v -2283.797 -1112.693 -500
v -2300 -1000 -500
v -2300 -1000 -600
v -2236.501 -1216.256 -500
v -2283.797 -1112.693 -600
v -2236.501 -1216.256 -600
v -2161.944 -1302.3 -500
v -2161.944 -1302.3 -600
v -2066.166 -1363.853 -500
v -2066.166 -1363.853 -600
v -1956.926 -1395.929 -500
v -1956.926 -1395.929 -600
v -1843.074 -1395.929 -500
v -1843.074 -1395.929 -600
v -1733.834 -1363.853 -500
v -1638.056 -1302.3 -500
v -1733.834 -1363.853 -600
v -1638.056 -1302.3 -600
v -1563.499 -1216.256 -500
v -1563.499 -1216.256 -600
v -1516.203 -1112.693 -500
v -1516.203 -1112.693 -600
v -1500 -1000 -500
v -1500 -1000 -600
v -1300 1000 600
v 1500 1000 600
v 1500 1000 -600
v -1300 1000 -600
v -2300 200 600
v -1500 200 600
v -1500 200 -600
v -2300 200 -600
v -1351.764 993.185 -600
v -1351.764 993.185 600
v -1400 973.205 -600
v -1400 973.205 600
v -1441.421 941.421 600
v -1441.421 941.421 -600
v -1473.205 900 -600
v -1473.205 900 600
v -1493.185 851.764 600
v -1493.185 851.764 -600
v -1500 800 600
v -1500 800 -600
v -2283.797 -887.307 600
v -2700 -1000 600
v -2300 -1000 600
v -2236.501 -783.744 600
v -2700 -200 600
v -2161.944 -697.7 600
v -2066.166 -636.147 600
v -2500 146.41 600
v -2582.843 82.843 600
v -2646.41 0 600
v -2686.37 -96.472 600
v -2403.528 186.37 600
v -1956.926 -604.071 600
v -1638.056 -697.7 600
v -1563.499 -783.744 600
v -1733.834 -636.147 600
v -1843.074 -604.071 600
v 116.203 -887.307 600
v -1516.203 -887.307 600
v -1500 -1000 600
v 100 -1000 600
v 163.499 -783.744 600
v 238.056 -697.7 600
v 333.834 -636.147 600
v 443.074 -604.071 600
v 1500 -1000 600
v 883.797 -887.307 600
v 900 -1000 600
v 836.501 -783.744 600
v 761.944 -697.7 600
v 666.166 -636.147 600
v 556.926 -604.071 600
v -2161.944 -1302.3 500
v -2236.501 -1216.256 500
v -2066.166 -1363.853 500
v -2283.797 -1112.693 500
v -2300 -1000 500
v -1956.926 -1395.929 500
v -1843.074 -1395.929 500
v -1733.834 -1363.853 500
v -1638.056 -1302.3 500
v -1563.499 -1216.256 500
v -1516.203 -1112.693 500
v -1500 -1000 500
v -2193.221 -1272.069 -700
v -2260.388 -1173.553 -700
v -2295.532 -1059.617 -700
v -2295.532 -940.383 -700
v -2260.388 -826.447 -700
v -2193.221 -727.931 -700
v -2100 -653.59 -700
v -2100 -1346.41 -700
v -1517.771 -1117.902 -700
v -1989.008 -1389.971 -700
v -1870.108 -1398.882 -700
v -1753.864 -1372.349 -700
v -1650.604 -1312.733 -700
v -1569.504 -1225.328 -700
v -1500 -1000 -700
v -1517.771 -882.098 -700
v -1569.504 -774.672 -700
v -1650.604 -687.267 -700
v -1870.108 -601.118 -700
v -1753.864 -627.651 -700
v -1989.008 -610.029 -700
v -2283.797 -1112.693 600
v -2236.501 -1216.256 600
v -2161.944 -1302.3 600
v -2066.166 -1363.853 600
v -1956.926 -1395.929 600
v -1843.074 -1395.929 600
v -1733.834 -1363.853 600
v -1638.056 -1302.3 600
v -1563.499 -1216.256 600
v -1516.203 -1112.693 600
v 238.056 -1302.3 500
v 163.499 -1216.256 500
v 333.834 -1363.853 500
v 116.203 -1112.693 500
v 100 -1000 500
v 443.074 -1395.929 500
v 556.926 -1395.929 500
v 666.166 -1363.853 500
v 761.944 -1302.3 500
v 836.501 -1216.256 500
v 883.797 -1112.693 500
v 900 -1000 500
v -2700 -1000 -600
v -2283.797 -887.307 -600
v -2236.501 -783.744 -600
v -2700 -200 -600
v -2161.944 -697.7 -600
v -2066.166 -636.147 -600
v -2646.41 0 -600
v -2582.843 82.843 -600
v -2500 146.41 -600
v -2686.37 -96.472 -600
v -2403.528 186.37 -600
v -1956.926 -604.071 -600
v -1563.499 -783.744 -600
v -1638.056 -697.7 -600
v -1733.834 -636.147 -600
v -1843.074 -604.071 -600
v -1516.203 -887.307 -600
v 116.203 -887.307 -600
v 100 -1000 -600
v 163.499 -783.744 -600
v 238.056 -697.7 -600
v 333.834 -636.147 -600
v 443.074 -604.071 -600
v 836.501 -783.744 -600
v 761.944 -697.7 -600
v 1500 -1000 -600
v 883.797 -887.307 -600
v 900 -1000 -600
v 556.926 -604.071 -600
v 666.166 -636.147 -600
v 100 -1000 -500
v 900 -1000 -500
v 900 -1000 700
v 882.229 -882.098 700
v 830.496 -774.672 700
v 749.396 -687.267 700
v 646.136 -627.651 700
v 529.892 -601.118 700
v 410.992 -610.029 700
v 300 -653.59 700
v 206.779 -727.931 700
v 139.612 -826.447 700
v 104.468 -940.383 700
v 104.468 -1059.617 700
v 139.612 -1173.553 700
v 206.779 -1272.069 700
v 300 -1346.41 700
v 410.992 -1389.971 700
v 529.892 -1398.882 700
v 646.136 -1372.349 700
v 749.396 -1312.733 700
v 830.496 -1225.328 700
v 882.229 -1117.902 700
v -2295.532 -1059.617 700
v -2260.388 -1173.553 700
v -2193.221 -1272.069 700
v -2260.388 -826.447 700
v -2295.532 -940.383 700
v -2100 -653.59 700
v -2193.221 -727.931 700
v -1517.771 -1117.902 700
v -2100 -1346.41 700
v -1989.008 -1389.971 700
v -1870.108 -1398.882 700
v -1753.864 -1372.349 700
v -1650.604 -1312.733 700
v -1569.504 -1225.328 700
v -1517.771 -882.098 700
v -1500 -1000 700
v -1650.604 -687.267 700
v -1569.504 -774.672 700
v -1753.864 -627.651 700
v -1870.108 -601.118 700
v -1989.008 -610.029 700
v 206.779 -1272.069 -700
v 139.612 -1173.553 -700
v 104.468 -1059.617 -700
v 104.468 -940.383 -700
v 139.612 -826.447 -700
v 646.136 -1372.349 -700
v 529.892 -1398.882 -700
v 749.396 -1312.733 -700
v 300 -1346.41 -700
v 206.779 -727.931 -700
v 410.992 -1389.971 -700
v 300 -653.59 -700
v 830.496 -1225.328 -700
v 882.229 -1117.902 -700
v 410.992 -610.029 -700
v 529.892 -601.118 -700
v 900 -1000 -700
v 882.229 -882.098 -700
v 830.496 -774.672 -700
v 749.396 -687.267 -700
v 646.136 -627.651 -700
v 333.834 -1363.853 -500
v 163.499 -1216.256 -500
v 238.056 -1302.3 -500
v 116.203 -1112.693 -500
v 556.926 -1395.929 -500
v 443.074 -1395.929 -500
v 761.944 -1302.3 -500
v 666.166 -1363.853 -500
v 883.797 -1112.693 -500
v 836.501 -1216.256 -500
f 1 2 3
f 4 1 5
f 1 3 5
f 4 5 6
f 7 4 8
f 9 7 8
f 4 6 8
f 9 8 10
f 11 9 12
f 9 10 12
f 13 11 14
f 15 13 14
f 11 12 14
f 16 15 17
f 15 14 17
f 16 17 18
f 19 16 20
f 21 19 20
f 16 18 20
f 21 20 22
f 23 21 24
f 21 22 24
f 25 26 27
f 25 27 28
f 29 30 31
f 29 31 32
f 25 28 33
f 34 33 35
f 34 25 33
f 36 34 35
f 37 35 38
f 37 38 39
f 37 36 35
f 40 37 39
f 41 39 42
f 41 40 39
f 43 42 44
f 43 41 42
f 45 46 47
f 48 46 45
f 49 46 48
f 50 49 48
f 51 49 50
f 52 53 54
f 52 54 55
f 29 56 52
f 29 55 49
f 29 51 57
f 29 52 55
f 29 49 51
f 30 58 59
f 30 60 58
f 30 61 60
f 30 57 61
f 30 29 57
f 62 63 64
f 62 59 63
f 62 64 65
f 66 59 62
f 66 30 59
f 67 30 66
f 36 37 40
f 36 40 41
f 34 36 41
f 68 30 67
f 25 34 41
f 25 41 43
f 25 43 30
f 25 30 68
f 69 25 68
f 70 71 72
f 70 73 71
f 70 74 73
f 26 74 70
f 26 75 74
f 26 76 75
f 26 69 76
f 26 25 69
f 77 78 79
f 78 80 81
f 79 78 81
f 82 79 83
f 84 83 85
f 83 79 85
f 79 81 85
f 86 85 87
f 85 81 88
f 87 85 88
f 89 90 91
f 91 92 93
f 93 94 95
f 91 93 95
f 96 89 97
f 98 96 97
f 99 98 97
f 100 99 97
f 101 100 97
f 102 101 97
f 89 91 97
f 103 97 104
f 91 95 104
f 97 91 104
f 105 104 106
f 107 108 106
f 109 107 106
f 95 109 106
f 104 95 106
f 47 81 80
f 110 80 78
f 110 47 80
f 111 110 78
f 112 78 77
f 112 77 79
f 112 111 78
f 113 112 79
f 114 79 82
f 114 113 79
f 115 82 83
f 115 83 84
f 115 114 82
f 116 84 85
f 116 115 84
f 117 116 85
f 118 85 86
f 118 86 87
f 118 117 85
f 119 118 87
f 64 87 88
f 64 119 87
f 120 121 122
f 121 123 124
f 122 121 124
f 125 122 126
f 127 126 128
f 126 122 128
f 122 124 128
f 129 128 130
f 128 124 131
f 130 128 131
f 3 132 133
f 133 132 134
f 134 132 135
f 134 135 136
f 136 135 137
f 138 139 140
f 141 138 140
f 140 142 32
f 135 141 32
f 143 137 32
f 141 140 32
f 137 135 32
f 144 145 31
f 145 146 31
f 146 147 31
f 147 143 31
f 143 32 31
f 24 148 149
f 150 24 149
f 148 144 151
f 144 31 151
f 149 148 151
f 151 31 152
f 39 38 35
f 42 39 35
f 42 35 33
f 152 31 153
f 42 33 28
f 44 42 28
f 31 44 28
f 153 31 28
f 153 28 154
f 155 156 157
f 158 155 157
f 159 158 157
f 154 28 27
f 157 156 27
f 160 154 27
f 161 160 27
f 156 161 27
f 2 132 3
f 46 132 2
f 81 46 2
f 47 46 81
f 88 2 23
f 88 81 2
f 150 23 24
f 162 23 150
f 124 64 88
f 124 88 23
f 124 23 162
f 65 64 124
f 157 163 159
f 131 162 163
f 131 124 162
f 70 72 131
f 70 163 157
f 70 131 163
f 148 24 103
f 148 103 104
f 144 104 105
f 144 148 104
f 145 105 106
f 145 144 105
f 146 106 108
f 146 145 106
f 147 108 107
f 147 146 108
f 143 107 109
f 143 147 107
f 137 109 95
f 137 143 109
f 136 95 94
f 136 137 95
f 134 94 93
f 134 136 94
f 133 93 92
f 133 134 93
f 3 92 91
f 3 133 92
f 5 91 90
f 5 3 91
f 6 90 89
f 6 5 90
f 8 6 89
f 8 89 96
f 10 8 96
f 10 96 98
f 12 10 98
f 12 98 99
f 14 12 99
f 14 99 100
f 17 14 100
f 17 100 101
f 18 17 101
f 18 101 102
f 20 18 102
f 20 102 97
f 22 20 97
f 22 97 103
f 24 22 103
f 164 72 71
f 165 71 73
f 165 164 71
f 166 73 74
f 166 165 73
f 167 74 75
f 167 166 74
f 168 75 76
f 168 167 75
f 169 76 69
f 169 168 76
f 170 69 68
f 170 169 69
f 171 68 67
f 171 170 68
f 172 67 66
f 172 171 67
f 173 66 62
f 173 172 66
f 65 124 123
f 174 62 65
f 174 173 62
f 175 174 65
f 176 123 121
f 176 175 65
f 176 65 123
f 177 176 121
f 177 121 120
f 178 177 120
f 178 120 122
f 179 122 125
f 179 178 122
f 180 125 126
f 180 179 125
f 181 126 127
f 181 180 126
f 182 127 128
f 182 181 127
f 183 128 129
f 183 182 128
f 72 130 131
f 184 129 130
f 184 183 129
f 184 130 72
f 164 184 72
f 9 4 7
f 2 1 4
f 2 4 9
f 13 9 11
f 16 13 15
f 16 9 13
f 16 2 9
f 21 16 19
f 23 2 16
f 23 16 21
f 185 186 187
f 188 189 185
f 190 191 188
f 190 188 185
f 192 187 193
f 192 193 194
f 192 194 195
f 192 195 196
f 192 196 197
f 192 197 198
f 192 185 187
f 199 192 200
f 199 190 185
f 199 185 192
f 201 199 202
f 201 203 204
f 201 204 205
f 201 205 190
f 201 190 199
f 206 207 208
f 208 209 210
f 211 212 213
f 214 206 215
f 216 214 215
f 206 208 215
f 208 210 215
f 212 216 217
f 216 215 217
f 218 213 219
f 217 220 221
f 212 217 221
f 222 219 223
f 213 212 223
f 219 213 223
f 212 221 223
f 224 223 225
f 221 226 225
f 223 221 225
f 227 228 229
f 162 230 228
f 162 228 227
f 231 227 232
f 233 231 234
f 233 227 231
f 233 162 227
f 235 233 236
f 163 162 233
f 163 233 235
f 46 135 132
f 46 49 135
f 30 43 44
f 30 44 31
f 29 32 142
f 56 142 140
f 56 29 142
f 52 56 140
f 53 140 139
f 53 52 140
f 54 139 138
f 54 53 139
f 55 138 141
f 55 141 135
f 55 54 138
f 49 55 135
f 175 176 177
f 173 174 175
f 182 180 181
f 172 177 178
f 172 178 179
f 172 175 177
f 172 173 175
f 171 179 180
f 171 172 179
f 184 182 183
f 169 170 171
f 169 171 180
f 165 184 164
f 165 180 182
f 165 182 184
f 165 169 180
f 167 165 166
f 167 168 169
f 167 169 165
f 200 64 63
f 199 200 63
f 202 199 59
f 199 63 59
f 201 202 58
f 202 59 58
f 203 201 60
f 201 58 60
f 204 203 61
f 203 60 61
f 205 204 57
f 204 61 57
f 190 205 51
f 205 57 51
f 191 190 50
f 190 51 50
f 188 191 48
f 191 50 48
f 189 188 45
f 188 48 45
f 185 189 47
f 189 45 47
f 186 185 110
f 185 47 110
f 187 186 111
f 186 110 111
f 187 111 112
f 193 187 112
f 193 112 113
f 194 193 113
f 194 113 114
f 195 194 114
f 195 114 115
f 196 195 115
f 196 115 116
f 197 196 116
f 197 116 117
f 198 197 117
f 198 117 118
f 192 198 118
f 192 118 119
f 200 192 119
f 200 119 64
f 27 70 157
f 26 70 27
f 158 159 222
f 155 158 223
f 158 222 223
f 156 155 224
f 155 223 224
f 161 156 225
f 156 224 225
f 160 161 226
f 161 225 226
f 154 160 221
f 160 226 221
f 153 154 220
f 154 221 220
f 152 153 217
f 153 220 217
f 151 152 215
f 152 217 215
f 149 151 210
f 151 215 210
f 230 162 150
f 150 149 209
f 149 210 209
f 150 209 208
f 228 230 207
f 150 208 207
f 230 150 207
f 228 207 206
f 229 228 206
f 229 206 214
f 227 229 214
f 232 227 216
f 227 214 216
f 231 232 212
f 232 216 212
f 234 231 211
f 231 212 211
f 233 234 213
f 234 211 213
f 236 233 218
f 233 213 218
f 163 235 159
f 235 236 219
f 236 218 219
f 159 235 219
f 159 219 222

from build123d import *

# Parameters (mm, degrees)
EXTRUDE_1_DEPTH = 600
EXTRUDE_START   = 600
SKETCH_1_3_R    = 400
EXTRUDE_2_DEPTH = 100


with BuildPart() as part:
    # 스케치1 → 보스-돌출1 (new, symmetric)
    with BuildSketch(Plane.XY):
        with BuildLine():
            Line((1500, -1000), (1500, 1000))
            Line((1500, 1000), (-1300, 1000))
            ThreePointArc((-1300, 1000), (-1441.421356237, 941.421356237), (-1500, 800))
            Line((-1500, 800), (-1500, 200))
            Line((-1500, 200), (-2300, 200))
            ThreePointArc((-2300, 200), (-2582.842712475, 82.842712475), (-2700, -200))
            Line((-2700, -200), (-2700, -1000))
            Line((-2700, -1000), (1500, -1000))
        make_face()
    extrude(amount=EXTRUDE_1_DEPTH, both=True)

    # 스케치1<3> → 보스-돌출2 (add, symmetric)
    with BuildSketch(Plane.XY.offset(EXTRUDE_START)):
        with Locations((500, -1000)):
            Circle(SKETCH_1_3_R)
        with Locations((-1900, -1000)):
            Circle(SKETCH_1_3_R)
    extrude_2 = extrude(amount=EXTRUDE_2_DEPTH, both=True)

    # 대칭 복사1: 보스-돌출2 across plane
    add(extrude_2.mirror(Plane.XY))


solid = part.part
